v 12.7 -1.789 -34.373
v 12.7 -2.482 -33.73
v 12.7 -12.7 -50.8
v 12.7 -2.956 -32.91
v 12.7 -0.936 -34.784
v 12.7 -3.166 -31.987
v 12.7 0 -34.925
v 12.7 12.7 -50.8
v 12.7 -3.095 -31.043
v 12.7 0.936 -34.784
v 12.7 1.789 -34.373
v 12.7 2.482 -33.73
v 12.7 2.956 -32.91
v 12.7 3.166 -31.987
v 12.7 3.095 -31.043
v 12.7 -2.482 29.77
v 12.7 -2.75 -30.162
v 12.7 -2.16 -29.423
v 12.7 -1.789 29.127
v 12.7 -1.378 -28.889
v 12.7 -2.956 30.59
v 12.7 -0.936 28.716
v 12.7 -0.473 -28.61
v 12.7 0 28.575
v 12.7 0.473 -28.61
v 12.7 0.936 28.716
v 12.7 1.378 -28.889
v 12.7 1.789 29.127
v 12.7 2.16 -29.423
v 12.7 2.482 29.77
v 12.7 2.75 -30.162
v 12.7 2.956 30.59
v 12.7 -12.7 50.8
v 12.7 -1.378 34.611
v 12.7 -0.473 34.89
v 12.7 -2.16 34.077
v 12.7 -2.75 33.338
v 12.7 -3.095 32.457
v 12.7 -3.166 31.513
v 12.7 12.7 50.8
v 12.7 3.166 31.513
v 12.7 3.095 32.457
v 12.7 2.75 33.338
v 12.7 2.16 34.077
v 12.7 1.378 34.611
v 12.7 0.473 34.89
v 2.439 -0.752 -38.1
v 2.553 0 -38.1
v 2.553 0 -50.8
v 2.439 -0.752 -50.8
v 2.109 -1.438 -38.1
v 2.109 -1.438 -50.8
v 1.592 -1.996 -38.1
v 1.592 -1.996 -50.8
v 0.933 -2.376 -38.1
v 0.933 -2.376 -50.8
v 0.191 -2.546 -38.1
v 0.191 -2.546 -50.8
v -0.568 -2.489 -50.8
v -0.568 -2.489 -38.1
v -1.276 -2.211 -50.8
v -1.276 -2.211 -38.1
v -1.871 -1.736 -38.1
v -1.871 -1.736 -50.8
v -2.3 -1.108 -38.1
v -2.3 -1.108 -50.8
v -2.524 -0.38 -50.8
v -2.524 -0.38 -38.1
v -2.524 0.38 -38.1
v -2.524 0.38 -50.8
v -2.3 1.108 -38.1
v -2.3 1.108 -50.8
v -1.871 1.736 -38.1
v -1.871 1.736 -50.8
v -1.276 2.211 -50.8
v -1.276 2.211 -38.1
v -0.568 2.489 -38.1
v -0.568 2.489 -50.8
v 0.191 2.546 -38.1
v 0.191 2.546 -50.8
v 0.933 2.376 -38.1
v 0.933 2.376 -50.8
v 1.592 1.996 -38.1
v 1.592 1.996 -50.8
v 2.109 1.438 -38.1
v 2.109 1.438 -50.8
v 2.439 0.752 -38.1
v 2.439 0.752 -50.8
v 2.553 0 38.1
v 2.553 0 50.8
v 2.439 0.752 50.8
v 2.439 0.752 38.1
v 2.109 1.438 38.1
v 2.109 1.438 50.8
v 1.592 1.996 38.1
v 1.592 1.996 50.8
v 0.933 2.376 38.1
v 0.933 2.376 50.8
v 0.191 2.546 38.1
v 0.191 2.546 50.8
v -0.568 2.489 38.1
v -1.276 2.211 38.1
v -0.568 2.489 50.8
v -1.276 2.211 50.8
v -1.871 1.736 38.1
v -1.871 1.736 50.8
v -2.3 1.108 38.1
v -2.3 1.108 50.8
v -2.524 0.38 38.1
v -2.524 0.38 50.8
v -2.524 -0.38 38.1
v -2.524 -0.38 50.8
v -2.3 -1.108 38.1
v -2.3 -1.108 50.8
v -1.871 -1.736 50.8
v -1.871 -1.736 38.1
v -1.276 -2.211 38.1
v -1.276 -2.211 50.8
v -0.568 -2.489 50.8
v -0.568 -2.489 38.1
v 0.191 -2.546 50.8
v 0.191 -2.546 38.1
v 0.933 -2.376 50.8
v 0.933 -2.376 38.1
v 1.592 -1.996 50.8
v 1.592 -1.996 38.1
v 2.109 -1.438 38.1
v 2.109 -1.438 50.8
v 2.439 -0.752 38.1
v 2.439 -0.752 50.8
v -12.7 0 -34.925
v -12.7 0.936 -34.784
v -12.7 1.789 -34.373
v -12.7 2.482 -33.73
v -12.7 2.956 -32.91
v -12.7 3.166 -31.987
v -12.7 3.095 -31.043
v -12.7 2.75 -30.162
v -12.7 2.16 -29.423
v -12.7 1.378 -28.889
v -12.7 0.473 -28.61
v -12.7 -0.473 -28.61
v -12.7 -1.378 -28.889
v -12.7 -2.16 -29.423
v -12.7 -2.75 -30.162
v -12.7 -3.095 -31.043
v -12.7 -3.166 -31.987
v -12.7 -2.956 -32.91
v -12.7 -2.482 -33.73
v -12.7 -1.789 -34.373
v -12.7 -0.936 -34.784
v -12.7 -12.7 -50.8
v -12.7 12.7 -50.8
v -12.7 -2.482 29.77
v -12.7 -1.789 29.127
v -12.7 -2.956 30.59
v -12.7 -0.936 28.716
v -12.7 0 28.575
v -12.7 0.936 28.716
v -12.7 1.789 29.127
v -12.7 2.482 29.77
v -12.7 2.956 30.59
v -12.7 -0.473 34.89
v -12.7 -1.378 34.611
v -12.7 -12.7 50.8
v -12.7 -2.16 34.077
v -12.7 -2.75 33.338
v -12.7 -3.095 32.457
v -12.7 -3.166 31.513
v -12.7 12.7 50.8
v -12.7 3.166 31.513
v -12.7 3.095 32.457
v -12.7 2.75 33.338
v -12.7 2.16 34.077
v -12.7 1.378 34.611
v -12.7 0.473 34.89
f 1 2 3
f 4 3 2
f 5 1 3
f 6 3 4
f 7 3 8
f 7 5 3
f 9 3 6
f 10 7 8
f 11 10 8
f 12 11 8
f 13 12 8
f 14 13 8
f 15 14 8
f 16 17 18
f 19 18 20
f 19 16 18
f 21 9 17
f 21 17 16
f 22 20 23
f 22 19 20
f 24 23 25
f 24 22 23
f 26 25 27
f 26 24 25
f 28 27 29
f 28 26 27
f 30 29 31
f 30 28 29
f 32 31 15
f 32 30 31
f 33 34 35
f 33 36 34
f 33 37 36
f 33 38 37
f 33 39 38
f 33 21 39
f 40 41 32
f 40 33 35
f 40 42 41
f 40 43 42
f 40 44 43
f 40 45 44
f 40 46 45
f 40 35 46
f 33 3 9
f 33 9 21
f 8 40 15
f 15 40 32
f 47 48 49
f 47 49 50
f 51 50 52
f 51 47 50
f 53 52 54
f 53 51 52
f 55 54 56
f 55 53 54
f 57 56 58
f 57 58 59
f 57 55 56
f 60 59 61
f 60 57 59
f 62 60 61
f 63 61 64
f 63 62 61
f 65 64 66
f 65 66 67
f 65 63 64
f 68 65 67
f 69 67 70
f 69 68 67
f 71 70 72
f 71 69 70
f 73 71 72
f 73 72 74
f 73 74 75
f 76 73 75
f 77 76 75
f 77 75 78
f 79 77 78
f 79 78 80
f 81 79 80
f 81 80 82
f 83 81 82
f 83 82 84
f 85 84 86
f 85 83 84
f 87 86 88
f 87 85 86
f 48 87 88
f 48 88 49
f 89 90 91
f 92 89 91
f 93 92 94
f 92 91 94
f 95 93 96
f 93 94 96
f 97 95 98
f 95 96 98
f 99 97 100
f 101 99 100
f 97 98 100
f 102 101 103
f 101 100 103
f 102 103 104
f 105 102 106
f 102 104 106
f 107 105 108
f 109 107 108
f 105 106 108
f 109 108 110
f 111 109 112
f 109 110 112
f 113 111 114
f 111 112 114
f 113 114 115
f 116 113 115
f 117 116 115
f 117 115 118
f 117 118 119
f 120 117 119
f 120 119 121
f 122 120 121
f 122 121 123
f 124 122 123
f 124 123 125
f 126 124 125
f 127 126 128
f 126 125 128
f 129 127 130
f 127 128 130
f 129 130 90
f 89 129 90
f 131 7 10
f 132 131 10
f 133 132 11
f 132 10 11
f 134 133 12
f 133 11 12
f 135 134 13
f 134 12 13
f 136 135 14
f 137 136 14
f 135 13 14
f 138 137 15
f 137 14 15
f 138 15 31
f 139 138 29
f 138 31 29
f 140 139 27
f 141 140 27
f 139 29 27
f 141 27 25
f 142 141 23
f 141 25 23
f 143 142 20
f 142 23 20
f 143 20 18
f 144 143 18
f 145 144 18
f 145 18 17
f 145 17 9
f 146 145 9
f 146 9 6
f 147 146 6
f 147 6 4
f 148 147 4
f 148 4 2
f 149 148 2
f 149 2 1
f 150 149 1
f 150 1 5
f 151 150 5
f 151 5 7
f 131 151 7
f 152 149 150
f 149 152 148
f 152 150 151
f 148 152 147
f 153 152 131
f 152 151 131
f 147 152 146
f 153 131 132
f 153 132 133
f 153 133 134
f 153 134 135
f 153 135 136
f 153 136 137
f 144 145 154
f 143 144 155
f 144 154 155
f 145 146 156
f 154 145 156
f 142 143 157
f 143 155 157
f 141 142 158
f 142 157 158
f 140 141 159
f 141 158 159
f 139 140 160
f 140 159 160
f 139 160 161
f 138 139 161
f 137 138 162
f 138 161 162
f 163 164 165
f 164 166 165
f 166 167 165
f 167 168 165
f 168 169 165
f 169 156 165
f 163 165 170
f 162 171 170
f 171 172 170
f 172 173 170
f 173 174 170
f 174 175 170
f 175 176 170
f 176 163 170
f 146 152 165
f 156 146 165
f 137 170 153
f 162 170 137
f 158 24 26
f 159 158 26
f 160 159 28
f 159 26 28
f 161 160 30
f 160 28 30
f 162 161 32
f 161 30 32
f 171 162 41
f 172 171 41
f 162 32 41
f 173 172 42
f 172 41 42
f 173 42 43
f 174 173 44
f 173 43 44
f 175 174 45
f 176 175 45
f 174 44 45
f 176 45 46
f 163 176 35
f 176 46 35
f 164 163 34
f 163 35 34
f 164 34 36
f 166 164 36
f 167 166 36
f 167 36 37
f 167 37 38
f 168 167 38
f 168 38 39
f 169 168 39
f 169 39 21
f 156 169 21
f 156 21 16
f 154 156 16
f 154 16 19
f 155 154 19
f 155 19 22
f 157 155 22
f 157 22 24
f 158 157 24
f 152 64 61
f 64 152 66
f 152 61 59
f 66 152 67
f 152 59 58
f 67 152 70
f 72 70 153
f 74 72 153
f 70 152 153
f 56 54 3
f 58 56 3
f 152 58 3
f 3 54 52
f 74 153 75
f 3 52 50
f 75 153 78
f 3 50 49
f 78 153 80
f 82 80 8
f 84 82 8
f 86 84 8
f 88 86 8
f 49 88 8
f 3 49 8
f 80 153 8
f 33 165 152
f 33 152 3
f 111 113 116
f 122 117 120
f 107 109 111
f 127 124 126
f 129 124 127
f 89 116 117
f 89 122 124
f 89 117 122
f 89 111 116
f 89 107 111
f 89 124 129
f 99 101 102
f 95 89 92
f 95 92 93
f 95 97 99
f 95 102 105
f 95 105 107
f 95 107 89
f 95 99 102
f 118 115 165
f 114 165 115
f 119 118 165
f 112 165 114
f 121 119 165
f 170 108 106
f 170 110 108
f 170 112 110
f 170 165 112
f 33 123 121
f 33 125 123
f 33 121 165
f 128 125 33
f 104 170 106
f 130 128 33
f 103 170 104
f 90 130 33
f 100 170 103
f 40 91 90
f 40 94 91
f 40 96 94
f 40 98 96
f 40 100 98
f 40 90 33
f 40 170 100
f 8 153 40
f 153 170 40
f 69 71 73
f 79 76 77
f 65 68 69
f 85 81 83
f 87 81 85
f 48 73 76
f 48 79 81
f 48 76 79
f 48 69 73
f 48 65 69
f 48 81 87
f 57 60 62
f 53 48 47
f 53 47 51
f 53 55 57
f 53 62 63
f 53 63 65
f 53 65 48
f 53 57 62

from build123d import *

# Parameters (mm, degrees)
SKETCH1_W           = 25.4
SKETCH1_H           = 25.4
BOSS_EXTRUDE1_DEPTH = 50.8
SKETCH2_R           = 2.5527
CUT_EXTRUDE1_DEPTH  = 12.7
CUT_EXTRUDE2_START  = -12.7
SKETCH3_R           = 2.5527
CUT_EXTRUDE2_DEPTH  = 12.7
SKETCH4_R           = 3.175
CUT_EXTRUDE3_DEPTH  = 59.198711326


with BuildPart() as part:
    # Sketch1 → Boss-Extrude1 (new, symmetric)
    with BuildSketch(Plane.XY):
        Rectangle(SKETCH1_W, SKETCH1_H)
    extrude(amount=BOSS_EXTRUDE1_DEPTH, both=True)

    # Sketch2 → Cut-Extrude1 (cut)
    with BuildSketch(Plane.XY.offset(50.8)):
        Circle(SKETCH2_R)
    extrude(amount=-CUT_EXTRUDE1_DEPTH, mode=Mode.SUBTRACT)

    # Sketch3 → Cut-Extrude2 (cut)
    with BuildSketch(Plane(origin=(0, 0, -50.8), x_dir=(-1, 0, 0), z_dir=(0, 0, -1)).offset(CUT_EXTRUDE2_START)):
        with Locations(Location((0, 0, 0), (0, 0, 180))):
            Circle(SKETCH3_R)
    extrude(amount=CUT_EXTRUDE2_DEPTH, mode=Mode.SUBTRACT)

    # Sketch4 → Cut-Extrude3 (cut, through all)
    with BuildSketch(Plane(origin=(12.7, 0, 0), x_dir=(0, 0, -1), z_dir=(1, 0, 0))):
        with Locations((-31.75, 0)):
            Circle(SKETCH4_R)
        with Locations((31.75, 0)):
            Circle(SKETCH4_R)
    extrude(amount=-CUT_EXTRUDE3_DEPTH, mode=Mode.SUBTRACT)


solid = part.part
